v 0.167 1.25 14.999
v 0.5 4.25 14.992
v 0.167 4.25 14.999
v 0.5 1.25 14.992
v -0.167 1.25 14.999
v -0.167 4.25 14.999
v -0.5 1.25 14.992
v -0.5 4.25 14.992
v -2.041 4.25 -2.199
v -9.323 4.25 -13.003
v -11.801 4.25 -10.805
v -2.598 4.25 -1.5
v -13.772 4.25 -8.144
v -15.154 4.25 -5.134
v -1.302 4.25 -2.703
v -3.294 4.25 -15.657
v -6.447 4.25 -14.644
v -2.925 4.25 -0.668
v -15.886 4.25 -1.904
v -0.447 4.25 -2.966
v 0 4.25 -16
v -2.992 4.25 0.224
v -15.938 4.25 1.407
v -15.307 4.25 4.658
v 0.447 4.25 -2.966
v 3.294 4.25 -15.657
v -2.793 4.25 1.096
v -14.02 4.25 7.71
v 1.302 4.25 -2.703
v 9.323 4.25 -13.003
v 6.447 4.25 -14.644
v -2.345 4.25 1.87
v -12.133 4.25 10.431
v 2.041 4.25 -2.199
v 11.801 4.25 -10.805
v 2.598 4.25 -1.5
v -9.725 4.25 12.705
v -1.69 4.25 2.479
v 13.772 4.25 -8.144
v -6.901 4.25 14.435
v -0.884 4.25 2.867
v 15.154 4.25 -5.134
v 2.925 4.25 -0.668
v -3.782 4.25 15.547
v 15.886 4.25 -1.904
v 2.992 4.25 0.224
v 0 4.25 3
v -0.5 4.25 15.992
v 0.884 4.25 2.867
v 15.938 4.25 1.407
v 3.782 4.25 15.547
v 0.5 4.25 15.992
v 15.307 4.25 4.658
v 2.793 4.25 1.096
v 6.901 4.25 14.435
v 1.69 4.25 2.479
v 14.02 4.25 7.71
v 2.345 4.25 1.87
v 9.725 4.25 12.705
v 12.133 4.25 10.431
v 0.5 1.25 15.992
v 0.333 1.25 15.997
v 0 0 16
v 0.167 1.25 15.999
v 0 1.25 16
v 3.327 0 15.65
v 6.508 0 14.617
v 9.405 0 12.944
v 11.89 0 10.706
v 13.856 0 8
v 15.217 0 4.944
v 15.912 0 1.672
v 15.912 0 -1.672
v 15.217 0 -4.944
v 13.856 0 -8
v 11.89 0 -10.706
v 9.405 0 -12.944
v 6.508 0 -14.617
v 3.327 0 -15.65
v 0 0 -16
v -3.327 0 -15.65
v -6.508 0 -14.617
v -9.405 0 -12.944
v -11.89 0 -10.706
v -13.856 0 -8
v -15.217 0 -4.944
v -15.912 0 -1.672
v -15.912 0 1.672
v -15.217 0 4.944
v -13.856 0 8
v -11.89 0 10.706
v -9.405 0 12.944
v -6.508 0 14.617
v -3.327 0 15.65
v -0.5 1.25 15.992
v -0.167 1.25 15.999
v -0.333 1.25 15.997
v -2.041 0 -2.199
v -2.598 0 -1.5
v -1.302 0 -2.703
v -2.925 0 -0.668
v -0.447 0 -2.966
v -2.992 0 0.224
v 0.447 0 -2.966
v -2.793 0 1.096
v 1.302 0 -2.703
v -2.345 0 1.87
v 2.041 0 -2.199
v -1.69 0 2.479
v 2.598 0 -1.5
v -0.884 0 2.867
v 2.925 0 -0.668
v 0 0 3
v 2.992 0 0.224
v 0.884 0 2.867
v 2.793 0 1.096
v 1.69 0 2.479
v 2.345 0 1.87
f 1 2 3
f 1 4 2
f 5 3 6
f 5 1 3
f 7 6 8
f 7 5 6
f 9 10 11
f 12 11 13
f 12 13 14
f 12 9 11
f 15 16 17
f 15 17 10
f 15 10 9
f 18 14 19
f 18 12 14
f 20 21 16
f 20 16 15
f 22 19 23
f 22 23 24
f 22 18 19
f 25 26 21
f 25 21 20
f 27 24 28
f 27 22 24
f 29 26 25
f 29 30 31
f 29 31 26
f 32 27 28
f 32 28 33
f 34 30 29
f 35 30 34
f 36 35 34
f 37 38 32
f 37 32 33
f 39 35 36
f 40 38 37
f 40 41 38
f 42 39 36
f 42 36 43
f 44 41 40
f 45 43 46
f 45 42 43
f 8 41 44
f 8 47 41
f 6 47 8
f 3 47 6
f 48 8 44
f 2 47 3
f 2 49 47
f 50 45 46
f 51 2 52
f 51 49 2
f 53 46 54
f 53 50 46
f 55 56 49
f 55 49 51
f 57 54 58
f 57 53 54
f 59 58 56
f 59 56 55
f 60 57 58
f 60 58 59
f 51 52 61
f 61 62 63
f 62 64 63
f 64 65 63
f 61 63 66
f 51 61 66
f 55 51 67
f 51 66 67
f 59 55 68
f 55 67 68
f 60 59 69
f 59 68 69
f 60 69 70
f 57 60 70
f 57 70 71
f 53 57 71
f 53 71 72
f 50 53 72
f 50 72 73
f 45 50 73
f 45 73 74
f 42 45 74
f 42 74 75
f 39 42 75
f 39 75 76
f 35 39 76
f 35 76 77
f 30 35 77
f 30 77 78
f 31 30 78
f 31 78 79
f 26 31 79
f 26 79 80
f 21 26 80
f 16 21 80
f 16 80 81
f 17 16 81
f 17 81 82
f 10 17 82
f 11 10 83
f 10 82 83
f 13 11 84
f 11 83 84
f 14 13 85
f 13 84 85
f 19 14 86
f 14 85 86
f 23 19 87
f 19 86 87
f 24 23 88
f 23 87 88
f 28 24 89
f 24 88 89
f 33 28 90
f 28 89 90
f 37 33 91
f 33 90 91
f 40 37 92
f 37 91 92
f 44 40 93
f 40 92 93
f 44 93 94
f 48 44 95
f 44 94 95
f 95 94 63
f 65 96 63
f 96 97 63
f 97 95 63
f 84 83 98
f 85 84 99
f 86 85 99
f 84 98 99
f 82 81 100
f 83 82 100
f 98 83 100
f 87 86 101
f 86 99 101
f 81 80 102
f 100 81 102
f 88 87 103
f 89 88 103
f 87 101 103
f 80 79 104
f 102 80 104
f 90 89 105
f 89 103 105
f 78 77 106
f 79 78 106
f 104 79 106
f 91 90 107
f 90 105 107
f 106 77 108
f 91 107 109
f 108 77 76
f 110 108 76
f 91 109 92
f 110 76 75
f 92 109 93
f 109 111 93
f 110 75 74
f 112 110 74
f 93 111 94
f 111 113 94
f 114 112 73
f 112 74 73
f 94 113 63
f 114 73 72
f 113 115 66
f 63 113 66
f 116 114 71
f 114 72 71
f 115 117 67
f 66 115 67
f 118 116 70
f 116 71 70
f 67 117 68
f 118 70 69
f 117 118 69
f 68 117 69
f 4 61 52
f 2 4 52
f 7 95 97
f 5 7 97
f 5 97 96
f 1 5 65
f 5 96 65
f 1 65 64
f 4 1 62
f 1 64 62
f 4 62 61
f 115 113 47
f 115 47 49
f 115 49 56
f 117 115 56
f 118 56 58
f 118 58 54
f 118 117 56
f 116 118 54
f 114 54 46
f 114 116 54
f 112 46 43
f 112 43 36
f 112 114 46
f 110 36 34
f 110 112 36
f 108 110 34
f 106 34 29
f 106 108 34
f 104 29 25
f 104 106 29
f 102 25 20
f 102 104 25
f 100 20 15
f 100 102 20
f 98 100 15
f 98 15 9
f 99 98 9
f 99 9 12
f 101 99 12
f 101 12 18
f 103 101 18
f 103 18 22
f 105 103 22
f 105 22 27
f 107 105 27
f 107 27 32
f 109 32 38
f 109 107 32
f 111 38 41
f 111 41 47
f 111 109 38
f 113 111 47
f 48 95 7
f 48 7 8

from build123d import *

# Parameters (mm, degrees)
SKETCH1_R                 = 16
SKETCH1_R_2               = 3
BOSS_EXTRUDE1_DEPTH       = 4.25
CUT_EXTRUDE1_REACH        = 26.023
CUT_EXTRUDE1_START_RADIUS = 16
CUT_EXTRUDE1_END_RADIUS   = 16
SKETCH2_W                 = 1
SKETCH2_H                 = 3


with BuildPart() as part:
    # Sketch1 → Boss-Extrude1 (new body)
    with BuildSketch(Plane(origin=(0, 0, 0), x_dir=(1, 0, 0), z_dir=(0, 1, 0))):
        with Locations(Location((0, 0, 0), (0, 0, 270))):
            Circle(SKETCH1_R)
        with Locations(Location((0, 0, 0), (0, 0, 270))):
            Circle(SKETCH1_R_2, mode=Mode.SUBTRACT)
    extrude(amount=BOSS_EXTRUDE1_DEPTH)

    # Cut-Extrude1: from a cylinder face, 26.023 long prism both ways, kept between that surface and its translate by the depth
    cut_extrude1_start = Plane(origin=(0, 2.75, 0), z_dir=(0, -1, 0)) * Cylinder(CUT_EXTRUDE1_START_RADIUS, 85.046, mode=Mode.PRIVATE)
    cut_extrude1_end = Plane(origin=(0, 2.75, -1), z_dir=(0, -1, 0)) * Cylinder(CUT_EXTRUDE1_END_RADIUS, 85.046, mode=Mode.PRIVATE)
    # Sketch2 → Cut-Extrude1 (cut, from a surface)
    with BuildSketch(Plane.XY, mode=Mode.PRIVATE) as cut_extrude1_sk1:
        with Locations((0, 2.75)):
            Rectangle(SKETCH2_W, SKETCH2_H)
    cut_extrude1_tool1 = extrude(cut_extrude1_sk1.sketch, amount=CUT_EXTRUDE1_REACH, both=True, mode=Mode.PRIVATE)
    add(((cut_extrude1_tool1 & cut_extrude1_start) - cut_extrude1_end).solids().sort_by_distance((0, 2.75, 15.492186))[0], mode=Mode.SUBTRACT)


solid = part.part
